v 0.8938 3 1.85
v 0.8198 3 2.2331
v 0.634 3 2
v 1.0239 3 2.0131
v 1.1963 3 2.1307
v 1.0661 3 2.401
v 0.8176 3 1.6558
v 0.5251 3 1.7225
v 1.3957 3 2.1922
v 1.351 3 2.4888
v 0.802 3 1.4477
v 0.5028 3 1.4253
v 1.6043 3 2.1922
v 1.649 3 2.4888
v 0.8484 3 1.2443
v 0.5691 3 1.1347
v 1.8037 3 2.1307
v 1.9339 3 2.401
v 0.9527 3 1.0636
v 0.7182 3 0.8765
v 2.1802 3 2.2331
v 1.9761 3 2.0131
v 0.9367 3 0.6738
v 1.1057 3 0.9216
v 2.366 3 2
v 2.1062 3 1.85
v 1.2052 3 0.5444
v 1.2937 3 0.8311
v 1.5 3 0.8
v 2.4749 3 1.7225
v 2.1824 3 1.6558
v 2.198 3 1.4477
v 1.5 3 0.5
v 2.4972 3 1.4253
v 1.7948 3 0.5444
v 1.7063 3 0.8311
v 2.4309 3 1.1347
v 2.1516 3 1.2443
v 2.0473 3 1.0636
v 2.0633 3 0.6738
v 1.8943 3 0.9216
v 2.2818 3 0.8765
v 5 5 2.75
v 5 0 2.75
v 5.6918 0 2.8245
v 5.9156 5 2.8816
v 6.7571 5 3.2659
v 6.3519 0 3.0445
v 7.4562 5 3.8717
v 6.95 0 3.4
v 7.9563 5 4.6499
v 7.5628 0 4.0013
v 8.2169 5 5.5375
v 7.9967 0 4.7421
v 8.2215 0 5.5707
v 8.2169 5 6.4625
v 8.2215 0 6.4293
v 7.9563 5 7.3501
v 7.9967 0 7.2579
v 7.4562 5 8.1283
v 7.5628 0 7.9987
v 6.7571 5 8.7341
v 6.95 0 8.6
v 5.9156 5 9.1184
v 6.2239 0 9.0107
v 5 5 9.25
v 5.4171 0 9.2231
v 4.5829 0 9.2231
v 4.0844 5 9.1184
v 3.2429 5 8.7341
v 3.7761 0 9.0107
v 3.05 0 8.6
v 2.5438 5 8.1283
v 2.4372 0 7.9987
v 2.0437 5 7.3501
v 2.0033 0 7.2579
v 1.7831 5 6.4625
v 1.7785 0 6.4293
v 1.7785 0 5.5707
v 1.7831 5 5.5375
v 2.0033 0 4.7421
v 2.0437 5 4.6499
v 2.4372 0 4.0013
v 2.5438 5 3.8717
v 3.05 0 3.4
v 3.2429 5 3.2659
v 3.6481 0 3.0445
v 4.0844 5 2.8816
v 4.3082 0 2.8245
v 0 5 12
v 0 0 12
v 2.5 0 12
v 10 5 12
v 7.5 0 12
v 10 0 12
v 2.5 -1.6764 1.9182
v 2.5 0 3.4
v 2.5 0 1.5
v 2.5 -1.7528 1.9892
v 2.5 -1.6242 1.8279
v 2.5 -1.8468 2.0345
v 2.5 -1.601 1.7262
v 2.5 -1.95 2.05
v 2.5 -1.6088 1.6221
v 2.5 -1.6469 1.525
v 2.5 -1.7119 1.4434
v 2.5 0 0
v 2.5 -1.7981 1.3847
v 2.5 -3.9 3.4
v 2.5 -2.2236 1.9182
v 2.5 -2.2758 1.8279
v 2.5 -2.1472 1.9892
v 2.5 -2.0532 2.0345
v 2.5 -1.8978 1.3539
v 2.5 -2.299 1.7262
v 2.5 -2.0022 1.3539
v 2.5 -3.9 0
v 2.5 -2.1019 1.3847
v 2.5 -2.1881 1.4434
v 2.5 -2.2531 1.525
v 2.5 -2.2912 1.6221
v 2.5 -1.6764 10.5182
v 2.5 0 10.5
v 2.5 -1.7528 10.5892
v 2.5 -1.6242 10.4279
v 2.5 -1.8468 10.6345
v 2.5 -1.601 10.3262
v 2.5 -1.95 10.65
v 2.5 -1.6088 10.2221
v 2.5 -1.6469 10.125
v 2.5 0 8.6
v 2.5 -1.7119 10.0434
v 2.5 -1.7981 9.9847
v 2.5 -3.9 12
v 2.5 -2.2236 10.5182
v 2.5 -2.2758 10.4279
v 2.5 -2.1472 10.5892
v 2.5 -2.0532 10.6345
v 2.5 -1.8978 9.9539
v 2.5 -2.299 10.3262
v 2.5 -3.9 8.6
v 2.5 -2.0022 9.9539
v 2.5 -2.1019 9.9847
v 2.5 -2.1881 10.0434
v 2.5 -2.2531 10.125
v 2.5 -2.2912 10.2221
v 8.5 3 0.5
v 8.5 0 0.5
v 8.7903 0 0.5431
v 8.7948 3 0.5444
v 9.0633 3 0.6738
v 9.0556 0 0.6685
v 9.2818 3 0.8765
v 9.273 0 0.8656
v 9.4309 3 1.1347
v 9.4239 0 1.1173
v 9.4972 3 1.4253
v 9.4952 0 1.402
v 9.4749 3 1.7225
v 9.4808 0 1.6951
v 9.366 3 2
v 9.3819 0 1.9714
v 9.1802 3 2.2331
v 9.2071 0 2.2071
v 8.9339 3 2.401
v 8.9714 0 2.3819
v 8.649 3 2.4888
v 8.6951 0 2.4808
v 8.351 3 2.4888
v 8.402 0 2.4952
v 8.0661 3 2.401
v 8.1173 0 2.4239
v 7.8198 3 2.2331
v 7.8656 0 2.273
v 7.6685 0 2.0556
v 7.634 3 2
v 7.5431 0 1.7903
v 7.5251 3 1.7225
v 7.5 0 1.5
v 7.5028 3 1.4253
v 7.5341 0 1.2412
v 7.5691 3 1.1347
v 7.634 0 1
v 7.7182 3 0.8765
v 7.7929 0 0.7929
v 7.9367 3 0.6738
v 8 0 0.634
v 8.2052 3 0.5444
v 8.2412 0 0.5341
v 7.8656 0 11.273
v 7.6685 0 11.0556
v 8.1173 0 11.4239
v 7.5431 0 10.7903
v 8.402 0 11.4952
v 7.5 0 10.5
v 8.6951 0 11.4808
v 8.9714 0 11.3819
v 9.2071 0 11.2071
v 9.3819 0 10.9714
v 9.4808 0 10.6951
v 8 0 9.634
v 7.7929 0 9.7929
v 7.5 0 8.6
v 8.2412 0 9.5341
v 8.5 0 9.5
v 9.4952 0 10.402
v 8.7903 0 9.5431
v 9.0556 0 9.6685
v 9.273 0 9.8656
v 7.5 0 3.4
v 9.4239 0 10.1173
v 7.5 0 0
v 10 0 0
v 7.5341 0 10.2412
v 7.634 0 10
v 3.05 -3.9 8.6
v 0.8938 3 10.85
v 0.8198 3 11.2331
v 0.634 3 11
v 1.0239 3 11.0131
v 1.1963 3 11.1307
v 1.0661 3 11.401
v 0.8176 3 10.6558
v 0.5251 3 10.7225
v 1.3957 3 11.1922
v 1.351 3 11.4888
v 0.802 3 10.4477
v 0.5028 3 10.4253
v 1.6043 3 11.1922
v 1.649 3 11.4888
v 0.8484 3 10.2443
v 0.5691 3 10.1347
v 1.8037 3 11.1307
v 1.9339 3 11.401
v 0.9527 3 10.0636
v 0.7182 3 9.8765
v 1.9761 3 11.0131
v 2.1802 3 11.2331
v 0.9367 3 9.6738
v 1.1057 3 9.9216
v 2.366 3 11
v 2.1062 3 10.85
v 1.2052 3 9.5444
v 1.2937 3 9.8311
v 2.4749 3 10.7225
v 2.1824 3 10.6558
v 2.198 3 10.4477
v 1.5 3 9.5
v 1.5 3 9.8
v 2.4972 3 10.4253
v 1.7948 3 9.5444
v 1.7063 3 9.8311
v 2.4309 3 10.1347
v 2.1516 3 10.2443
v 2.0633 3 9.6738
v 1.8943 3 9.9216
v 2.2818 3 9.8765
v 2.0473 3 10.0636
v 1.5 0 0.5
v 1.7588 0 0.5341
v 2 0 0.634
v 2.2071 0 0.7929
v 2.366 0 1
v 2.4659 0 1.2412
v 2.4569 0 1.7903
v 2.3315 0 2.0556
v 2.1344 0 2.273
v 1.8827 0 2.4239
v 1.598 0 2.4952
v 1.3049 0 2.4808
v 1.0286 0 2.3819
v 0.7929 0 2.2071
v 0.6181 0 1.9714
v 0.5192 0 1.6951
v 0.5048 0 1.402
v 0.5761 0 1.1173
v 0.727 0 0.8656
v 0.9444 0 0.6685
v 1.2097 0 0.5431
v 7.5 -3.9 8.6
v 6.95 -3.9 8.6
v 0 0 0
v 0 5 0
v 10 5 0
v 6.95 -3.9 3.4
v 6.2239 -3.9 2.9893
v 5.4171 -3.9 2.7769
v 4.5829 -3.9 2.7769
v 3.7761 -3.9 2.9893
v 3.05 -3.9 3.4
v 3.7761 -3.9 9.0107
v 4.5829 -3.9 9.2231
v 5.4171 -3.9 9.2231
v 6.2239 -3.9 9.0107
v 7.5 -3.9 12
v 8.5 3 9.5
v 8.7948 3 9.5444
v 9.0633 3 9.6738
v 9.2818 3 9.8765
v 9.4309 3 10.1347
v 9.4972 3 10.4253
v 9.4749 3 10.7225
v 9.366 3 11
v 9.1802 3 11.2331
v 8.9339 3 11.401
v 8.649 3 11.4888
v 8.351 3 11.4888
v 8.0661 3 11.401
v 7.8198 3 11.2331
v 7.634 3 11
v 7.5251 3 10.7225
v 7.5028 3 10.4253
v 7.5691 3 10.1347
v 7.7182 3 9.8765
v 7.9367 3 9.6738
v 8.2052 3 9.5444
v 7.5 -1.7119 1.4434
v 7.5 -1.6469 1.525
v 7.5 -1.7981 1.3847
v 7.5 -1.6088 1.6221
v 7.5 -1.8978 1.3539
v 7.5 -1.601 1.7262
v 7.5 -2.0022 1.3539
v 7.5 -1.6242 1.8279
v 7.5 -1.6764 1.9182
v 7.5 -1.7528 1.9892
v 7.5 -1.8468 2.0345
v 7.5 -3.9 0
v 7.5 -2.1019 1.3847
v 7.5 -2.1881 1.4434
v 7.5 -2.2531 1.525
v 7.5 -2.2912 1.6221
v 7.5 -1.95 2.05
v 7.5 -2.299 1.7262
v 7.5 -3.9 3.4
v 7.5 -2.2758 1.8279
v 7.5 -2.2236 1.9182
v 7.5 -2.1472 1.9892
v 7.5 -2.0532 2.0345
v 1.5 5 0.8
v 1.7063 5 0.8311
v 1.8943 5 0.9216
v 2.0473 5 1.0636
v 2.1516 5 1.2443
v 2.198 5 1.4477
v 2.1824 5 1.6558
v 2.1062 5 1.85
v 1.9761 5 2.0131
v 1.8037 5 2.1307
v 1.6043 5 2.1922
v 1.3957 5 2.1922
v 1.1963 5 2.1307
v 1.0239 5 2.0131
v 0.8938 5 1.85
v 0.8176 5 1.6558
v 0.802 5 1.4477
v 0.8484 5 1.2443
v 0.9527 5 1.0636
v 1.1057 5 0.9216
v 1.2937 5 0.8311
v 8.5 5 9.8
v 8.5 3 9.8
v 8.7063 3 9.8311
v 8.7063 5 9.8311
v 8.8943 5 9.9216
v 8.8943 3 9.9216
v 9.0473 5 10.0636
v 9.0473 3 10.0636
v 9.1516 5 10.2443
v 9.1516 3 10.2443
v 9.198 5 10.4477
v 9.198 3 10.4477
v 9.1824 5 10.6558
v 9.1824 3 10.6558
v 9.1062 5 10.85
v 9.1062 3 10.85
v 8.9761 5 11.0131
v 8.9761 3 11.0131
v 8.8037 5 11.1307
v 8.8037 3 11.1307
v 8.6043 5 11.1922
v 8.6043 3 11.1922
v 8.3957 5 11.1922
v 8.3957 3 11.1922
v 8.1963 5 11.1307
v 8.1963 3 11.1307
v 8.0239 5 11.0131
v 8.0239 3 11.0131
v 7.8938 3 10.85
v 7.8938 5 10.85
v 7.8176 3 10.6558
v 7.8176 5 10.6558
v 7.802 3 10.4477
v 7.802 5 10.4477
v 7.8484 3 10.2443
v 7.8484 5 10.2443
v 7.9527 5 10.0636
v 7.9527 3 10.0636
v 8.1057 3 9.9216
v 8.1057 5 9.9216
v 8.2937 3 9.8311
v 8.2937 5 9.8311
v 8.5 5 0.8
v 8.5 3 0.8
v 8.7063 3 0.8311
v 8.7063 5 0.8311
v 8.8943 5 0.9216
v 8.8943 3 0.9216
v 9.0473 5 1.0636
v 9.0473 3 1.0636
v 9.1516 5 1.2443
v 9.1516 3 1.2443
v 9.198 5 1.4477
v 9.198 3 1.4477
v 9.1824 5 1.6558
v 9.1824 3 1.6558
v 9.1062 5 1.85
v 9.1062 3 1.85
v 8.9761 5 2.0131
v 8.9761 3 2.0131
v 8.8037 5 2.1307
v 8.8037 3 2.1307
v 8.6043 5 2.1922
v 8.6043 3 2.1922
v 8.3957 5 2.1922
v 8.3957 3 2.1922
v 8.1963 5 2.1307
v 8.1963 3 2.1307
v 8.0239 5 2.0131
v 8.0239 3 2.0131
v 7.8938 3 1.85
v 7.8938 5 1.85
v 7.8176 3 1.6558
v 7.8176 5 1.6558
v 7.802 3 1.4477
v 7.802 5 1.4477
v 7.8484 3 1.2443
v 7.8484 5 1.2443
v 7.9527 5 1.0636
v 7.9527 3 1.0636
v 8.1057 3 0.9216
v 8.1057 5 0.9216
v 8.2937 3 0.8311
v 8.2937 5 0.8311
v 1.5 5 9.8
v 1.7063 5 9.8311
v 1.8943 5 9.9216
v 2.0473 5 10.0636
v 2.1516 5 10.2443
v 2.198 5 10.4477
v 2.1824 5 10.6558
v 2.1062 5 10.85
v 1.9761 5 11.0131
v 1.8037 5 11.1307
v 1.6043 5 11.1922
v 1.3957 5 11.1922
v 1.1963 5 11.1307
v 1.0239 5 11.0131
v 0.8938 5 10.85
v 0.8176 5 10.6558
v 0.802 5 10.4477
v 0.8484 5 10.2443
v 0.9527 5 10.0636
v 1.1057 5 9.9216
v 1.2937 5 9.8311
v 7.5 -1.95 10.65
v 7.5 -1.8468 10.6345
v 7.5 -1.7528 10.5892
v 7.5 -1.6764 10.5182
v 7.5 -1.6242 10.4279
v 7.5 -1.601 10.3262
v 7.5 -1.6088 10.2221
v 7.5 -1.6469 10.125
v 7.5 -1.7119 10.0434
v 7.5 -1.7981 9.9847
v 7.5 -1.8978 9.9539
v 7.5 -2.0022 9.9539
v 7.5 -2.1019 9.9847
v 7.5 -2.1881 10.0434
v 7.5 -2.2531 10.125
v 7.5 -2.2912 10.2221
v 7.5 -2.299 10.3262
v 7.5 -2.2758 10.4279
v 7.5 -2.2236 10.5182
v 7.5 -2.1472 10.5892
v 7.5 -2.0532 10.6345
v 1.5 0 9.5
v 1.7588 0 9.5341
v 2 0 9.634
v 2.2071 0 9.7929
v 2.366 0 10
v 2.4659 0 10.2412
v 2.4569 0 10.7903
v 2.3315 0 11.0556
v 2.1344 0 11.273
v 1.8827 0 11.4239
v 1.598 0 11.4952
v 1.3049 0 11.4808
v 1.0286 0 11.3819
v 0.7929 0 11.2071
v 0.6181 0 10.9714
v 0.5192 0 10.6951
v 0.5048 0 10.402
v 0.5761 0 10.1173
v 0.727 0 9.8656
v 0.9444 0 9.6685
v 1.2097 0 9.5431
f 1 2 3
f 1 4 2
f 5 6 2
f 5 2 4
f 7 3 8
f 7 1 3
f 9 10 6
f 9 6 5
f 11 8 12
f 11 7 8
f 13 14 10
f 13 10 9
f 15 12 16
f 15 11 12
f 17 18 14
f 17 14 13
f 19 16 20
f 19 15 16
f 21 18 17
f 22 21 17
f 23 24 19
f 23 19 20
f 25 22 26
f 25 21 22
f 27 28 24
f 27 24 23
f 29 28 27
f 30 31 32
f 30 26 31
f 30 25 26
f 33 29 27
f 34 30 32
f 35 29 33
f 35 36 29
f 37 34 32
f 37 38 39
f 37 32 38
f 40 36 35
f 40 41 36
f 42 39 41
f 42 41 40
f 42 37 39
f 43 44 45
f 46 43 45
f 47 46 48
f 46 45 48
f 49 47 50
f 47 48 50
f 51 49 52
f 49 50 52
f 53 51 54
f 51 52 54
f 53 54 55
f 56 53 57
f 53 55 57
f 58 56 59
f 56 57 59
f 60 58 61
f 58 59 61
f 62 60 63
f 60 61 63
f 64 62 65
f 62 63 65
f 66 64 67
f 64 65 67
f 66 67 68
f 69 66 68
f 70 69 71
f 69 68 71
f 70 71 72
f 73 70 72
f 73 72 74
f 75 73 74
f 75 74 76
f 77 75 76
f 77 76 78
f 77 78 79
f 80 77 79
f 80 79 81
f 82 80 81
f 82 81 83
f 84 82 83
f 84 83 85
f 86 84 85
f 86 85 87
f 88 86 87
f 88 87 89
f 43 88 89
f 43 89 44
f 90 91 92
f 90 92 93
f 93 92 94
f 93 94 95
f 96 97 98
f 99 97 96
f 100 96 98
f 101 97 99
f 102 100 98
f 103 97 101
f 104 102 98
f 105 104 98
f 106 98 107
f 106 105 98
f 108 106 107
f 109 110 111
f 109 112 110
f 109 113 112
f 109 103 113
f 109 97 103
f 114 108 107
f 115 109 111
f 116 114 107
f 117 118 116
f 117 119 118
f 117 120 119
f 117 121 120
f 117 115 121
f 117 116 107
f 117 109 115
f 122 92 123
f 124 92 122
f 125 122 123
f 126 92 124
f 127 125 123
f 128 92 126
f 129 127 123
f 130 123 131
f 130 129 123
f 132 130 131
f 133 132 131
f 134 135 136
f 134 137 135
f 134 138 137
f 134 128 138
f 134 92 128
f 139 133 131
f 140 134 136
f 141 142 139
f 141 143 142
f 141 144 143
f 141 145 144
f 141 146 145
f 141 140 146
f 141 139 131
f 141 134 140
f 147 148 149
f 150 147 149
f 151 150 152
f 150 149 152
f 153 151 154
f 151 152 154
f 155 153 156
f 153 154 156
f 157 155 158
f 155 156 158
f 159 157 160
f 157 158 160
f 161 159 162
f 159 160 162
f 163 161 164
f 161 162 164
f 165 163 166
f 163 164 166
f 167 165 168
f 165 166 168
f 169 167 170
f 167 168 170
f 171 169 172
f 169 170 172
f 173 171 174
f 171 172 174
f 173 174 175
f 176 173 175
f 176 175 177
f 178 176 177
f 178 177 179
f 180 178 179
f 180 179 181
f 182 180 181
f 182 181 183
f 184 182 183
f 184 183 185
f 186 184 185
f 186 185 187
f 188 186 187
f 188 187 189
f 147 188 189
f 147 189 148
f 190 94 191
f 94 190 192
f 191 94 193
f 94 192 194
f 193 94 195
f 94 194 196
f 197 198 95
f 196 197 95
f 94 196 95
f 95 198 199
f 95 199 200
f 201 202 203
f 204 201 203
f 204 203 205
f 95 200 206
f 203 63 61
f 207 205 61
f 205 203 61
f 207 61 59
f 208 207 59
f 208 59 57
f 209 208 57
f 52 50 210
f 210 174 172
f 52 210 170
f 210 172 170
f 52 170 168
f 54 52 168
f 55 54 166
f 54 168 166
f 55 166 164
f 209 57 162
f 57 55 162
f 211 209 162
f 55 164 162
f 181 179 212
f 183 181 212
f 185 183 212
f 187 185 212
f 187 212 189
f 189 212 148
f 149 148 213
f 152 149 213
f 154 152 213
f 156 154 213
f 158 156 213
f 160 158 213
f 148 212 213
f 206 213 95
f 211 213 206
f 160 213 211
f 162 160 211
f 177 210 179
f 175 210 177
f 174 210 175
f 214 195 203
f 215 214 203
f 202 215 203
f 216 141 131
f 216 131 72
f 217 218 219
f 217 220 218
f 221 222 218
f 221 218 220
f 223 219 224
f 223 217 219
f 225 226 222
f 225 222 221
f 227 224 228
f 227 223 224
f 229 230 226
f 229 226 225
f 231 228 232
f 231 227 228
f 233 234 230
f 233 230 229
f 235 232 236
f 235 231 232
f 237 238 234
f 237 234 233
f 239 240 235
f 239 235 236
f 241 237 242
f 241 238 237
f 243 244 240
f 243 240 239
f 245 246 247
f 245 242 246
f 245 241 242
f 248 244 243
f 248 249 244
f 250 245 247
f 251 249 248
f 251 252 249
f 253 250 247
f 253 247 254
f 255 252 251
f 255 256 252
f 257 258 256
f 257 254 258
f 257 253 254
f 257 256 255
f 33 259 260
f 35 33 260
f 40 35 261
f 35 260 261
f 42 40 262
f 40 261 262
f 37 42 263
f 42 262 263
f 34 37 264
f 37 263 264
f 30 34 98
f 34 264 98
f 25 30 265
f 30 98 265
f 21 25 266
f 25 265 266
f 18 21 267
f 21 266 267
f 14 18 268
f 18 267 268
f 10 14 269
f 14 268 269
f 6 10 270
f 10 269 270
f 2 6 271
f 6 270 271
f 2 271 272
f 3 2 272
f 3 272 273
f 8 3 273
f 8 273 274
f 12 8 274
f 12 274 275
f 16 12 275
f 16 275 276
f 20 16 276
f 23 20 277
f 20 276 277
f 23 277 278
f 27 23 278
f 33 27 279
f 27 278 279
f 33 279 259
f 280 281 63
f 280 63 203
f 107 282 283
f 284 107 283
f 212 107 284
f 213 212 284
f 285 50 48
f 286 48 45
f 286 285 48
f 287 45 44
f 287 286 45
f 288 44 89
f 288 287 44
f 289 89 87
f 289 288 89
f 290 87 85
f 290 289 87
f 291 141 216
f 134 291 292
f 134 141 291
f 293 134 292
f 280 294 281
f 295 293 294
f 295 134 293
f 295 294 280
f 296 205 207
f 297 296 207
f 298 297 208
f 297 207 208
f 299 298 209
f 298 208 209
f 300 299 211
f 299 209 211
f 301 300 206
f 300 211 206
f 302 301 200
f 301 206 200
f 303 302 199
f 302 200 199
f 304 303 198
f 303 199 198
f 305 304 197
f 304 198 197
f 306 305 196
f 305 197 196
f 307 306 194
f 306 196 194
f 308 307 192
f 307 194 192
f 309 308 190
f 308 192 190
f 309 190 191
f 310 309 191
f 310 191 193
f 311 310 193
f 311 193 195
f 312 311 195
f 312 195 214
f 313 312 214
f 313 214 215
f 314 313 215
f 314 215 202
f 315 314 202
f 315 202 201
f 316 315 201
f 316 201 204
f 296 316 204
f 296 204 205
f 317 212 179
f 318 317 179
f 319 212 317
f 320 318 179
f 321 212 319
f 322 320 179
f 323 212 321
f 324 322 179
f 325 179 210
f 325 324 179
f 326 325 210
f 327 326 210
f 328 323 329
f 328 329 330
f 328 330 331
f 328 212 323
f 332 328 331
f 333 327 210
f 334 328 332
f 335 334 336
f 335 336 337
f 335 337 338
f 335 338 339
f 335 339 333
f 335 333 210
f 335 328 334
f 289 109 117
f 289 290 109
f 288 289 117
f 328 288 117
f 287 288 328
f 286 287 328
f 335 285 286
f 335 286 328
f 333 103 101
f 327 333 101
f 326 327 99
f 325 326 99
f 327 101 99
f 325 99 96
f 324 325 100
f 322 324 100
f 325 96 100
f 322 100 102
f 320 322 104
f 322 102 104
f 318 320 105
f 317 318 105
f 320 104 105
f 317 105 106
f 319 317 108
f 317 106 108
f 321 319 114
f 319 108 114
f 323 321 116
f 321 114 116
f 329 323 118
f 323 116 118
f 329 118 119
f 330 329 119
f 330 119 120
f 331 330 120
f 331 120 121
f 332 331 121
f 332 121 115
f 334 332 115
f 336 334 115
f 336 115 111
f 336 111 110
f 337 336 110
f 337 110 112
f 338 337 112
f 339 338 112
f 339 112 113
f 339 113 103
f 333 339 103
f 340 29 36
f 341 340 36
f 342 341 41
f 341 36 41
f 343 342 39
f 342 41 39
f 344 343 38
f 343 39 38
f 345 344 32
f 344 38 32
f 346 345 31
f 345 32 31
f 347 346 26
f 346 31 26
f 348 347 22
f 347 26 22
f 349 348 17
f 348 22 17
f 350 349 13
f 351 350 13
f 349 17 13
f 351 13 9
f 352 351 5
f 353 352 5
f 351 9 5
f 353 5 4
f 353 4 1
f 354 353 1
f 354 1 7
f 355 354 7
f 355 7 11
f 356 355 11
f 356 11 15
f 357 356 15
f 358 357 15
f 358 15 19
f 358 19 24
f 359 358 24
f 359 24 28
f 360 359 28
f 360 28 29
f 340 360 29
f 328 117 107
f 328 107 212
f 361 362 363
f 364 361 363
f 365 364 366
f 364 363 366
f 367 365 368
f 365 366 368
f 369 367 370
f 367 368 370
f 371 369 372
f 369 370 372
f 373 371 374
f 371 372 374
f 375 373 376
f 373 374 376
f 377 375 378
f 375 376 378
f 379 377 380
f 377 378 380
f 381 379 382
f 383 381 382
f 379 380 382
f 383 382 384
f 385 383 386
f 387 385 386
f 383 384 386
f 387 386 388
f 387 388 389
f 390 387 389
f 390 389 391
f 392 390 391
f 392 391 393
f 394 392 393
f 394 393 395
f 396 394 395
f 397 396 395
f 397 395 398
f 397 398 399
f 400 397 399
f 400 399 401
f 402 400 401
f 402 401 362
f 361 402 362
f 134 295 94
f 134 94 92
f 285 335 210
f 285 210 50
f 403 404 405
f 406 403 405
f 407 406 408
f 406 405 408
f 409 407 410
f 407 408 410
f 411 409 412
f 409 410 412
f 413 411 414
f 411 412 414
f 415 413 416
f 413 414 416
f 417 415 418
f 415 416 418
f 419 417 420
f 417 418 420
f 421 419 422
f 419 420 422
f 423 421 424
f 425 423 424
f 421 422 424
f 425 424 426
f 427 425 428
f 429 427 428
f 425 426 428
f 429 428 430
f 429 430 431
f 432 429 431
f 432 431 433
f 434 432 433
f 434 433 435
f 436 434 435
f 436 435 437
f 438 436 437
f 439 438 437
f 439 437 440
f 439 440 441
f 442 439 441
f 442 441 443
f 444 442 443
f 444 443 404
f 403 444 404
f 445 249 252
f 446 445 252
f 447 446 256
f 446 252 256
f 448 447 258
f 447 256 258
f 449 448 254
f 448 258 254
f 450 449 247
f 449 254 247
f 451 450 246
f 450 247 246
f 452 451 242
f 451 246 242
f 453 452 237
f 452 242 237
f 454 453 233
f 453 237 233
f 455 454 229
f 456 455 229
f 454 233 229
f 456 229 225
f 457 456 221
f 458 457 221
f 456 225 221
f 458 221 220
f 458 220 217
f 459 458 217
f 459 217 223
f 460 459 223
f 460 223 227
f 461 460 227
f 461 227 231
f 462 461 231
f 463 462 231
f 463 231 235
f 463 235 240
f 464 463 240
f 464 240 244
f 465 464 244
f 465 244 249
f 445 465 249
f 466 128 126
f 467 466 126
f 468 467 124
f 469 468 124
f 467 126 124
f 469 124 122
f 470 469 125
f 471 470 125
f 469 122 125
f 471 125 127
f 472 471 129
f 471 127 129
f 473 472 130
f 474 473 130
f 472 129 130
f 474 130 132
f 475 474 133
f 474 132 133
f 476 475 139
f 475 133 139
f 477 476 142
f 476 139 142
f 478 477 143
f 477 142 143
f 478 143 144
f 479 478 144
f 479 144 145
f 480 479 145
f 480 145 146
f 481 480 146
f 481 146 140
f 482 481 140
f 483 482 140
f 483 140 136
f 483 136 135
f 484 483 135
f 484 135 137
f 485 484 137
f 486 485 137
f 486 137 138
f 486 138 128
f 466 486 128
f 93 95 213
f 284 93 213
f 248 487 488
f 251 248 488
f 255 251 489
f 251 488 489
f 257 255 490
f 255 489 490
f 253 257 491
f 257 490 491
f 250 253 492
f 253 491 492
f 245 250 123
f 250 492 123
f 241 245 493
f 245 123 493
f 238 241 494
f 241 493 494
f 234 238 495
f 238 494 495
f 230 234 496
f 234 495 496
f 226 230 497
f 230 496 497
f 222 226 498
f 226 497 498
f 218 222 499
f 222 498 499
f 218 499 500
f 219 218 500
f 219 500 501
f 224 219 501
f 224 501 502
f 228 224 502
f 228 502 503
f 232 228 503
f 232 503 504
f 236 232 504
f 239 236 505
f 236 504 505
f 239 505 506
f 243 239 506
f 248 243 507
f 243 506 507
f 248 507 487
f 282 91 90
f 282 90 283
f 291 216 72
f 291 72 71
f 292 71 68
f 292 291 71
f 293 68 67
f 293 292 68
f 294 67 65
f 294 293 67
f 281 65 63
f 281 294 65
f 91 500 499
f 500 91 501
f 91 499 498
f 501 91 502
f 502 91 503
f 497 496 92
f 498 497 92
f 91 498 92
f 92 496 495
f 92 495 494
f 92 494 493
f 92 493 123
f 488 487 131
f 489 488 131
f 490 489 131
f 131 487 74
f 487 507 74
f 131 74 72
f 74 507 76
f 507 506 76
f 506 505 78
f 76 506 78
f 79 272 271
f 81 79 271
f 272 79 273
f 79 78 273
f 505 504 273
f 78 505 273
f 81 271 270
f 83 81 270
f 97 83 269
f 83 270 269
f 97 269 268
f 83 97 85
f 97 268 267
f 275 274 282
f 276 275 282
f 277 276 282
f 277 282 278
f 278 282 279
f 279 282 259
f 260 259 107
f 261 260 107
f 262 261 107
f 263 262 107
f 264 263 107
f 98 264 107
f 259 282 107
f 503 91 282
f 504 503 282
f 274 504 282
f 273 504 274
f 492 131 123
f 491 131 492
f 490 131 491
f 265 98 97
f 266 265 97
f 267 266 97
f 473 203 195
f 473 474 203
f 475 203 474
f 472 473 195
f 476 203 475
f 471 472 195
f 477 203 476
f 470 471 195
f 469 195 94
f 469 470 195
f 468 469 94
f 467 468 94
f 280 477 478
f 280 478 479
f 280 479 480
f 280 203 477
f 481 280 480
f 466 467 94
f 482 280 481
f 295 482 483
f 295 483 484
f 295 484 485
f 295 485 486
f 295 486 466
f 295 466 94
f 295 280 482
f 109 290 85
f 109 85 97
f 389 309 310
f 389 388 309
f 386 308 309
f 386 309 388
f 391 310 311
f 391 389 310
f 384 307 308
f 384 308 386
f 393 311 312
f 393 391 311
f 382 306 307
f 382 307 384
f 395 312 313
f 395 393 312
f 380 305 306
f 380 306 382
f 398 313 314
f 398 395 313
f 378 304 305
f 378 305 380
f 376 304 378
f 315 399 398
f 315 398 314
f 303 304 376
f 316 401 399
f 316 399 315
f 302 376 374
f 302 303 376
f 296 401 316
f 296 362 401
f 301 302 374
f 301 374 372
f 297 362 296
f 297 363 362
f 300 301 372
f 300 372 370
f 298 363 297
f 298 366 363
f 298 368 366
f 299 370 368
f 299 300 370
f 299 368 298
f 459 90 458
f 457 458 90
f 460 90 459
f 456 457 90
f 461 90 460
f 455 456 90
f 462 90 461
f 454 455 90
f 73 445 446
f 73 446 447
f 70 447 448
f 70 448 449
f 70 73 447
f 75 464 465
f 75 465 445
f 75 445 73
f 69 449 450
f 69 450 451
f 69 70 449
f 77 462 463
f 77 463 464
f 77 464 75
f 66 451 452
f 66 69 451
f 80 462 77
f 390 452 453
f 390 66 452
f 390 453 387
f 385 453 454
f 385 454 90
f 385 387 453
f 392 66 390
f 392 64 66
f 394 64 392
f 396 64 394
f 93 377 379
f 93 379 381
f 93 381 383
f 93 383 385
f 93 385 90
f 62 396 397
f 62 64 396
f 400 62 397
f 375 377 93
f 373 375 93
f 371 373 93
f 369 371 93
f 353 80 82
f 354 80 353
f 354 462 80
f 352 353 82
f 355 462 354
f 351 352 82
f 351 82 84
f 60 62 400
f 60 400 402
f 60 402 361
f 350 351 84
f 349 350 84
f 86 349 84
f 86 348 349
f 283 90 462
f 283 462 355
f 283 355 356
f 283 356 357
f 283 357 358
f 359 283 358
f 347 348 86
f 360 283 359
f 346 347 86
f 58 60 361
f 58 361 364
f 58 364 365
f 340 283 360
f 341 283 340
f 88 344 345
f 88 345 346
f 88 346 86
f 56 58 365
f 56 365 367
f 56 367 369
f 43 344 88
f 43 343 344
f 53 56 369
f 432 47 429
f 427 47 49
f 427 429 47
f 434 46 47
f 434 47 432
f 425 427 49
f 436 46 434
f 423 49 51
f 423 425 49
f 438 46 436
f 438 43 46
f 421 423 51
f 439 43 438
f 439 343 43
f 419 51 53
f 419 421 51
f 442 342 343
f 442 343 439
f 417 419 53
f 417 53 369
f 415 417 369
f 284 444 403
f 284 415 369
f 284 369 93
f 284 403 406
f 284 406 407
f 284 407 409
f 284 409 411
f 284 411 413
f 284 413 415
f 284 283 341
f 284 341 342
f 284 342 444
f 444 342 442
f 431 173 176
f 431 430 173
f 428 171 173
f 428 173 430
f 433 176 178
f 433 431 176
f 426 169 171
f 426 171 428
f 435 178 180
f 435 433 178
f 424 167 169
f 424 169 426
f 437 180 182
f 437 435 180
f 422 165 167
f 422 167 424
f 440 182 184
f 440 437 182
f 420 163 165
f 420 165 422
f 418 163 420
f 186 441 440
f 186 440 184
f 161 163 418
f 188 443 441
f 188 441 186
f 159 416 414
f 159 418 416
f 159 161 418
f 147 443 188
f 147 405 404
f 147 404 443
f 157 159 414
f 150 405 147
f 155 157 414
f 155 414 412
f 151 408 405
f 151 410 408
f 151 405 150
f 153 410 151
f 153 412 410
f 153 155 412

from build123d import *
from build123d.topology import SkipClean

# Parameters (mm, degrees)
SKETCH_1_W          = 10
SKETCH_1_H          = 12
EXTRUDE_1_DEPTH     = 5
SKETCH_2_R          = 0.7
CUT_EXTRUDE_1_DEPTH = 17.401219467
SKETCH_2_3_R        = 3.25
CUT_EXTRUDE_2_DEPTH = 17.401219467
SKETCH_2_4_R        = 1
CUT_EXTRUDE_3_DEPTH = 3
EXTRUDE_START       = 3.9
EXTRUDE_2_DEPTH     = 3.9
SKETCH_4_R          = 0.35
CUT_EXTRUDE_4_DEPTH = 16.00833102


with BuildPart() as part:
    # 草图1 → 凸台-拉伸1 (new body)
    with BuildSketch(Plane(origin=(0, 0, 0), x_dir=(1, 0, 0), z_dir=(0, 1, 0))):
        with Locations((5, -6)):
            Rectangle(SKETCH_1_W, SKETCH_1_H)
    extrude(amount=EXTRUDE_1_DEPTH)

    # 草图2 → 切除-拉伸1 (cut, through all)
    with BuildSketch(Plane.XZ):
        with Locations(Location((1.5, 1.5, 0), (0, 0, 270))):
            Circle(SKETCH_2_R)
        with Locations(Location((1.5, 10.5, 0), (0, 0, 270))):
            Circle(SKETCH_2_R)
        with Locations(Location((8.5, 10.5, 0), (0, 0, 270))):
            Circle(SKETCH_2_R)
        with Locations(Location((8.5, 1.5, 0), (0, 0, 270))):
            Circle(SKETCH_2_R)
    extrude(amount=-CUT_EXTRUDE_1_DEPTH, mode=Mode.SUBTRACT)

    # 草图2<3> → 切除-拉伸2 (cut, through all)
    with BuildSketch(Plane.XZ):
        with Locations(Location((5, 6, 0), (0, 0, 270))):
            Circle(SKETCH_2_3_R)
    extrude(amount=-CUT_EXTRUDE_2_DEPTH, mode=Mode.SUBTRACT)

    # 草图2<4> → 切除-拉伸3 (cut)
    with BuildSketch(Plane.XZ):
        with Locations(Location((1.5, 10.5, 0), (0, 0, 270))):
            Circle(SKETCH_2_4_R)
        with Locations(Location((8.5, 10.5, 0), (0, 0, 270))):
            Circle(SKETCH_2_4_R)
        with Locations(Location((8.5, 1.5, 0), (0, 0, 270))):
            Circle(SKETCH_2_4_R)
        with Locations(Location((1.5, 1.5, 0), (0, 0, 270))):
            Circle(SKETCH_2_4_R)
    extrude(amount=-CUT_EXTRUDE_3_DEPTH, mode=Mode.SUBTRACT)

    # 草图3 → 凸台-拉伸2 (add)
    with SkipClean():  # the faces are left unmerged after this step: merging them gives an invalid solid
        with BuildSketch(Plane.XZ.offset(EXTRUDE_START)):
            with BuildLine():
                Line((2.5, 8.6), (3.05, 8.6))
                ThreePointArc((3.05, 8.6), (5, 9.25), (6.95, 8.6))
                Line((6.95, 8.6), (7.5, 8.6))
                Line((7.5, 8.6), (7.5, 12))
                Line((7.5, 12), (2.5, 12))
                Line((2.5, 12), (2.5, 8.6))
            make_face()
            with BuildLine():
                Line((2.5, 3.4), (2.5, 0))
                Line((2.5, 0), (7.5, 0))
                Line((7.5, 0), (7.5, 3.4))
                Line((7.5, 3.4), (6.95, 3.4))
                ThreePointArc((6.95, 3.4), (5, 2.75), (3.05, 3.4))
                Line((3.05, 3.4), (2.5, 3.4))
            make_face()
        extrude(amount=-EXTRUDE_2_DEPTH)

    # 草图4 → 切除-拉伸4 (cut, through all)
    with SkipClean():  # the faces are left unmerged after this step: merging them gives an invalid solid
        with BuildSketch(Plane.ZY.offset(-2.5)):
            with Locations((10.3, -1.95)):
                Circle(SKETCH_4_R)
            with Locations((1.7, -1.95)):
                Circle(SKETCH_4_R)
        extrude(amount=-CUT_EXTRUDE_4_DEPTH, mode=Mode.SUBTRACT)


solid = part.part
